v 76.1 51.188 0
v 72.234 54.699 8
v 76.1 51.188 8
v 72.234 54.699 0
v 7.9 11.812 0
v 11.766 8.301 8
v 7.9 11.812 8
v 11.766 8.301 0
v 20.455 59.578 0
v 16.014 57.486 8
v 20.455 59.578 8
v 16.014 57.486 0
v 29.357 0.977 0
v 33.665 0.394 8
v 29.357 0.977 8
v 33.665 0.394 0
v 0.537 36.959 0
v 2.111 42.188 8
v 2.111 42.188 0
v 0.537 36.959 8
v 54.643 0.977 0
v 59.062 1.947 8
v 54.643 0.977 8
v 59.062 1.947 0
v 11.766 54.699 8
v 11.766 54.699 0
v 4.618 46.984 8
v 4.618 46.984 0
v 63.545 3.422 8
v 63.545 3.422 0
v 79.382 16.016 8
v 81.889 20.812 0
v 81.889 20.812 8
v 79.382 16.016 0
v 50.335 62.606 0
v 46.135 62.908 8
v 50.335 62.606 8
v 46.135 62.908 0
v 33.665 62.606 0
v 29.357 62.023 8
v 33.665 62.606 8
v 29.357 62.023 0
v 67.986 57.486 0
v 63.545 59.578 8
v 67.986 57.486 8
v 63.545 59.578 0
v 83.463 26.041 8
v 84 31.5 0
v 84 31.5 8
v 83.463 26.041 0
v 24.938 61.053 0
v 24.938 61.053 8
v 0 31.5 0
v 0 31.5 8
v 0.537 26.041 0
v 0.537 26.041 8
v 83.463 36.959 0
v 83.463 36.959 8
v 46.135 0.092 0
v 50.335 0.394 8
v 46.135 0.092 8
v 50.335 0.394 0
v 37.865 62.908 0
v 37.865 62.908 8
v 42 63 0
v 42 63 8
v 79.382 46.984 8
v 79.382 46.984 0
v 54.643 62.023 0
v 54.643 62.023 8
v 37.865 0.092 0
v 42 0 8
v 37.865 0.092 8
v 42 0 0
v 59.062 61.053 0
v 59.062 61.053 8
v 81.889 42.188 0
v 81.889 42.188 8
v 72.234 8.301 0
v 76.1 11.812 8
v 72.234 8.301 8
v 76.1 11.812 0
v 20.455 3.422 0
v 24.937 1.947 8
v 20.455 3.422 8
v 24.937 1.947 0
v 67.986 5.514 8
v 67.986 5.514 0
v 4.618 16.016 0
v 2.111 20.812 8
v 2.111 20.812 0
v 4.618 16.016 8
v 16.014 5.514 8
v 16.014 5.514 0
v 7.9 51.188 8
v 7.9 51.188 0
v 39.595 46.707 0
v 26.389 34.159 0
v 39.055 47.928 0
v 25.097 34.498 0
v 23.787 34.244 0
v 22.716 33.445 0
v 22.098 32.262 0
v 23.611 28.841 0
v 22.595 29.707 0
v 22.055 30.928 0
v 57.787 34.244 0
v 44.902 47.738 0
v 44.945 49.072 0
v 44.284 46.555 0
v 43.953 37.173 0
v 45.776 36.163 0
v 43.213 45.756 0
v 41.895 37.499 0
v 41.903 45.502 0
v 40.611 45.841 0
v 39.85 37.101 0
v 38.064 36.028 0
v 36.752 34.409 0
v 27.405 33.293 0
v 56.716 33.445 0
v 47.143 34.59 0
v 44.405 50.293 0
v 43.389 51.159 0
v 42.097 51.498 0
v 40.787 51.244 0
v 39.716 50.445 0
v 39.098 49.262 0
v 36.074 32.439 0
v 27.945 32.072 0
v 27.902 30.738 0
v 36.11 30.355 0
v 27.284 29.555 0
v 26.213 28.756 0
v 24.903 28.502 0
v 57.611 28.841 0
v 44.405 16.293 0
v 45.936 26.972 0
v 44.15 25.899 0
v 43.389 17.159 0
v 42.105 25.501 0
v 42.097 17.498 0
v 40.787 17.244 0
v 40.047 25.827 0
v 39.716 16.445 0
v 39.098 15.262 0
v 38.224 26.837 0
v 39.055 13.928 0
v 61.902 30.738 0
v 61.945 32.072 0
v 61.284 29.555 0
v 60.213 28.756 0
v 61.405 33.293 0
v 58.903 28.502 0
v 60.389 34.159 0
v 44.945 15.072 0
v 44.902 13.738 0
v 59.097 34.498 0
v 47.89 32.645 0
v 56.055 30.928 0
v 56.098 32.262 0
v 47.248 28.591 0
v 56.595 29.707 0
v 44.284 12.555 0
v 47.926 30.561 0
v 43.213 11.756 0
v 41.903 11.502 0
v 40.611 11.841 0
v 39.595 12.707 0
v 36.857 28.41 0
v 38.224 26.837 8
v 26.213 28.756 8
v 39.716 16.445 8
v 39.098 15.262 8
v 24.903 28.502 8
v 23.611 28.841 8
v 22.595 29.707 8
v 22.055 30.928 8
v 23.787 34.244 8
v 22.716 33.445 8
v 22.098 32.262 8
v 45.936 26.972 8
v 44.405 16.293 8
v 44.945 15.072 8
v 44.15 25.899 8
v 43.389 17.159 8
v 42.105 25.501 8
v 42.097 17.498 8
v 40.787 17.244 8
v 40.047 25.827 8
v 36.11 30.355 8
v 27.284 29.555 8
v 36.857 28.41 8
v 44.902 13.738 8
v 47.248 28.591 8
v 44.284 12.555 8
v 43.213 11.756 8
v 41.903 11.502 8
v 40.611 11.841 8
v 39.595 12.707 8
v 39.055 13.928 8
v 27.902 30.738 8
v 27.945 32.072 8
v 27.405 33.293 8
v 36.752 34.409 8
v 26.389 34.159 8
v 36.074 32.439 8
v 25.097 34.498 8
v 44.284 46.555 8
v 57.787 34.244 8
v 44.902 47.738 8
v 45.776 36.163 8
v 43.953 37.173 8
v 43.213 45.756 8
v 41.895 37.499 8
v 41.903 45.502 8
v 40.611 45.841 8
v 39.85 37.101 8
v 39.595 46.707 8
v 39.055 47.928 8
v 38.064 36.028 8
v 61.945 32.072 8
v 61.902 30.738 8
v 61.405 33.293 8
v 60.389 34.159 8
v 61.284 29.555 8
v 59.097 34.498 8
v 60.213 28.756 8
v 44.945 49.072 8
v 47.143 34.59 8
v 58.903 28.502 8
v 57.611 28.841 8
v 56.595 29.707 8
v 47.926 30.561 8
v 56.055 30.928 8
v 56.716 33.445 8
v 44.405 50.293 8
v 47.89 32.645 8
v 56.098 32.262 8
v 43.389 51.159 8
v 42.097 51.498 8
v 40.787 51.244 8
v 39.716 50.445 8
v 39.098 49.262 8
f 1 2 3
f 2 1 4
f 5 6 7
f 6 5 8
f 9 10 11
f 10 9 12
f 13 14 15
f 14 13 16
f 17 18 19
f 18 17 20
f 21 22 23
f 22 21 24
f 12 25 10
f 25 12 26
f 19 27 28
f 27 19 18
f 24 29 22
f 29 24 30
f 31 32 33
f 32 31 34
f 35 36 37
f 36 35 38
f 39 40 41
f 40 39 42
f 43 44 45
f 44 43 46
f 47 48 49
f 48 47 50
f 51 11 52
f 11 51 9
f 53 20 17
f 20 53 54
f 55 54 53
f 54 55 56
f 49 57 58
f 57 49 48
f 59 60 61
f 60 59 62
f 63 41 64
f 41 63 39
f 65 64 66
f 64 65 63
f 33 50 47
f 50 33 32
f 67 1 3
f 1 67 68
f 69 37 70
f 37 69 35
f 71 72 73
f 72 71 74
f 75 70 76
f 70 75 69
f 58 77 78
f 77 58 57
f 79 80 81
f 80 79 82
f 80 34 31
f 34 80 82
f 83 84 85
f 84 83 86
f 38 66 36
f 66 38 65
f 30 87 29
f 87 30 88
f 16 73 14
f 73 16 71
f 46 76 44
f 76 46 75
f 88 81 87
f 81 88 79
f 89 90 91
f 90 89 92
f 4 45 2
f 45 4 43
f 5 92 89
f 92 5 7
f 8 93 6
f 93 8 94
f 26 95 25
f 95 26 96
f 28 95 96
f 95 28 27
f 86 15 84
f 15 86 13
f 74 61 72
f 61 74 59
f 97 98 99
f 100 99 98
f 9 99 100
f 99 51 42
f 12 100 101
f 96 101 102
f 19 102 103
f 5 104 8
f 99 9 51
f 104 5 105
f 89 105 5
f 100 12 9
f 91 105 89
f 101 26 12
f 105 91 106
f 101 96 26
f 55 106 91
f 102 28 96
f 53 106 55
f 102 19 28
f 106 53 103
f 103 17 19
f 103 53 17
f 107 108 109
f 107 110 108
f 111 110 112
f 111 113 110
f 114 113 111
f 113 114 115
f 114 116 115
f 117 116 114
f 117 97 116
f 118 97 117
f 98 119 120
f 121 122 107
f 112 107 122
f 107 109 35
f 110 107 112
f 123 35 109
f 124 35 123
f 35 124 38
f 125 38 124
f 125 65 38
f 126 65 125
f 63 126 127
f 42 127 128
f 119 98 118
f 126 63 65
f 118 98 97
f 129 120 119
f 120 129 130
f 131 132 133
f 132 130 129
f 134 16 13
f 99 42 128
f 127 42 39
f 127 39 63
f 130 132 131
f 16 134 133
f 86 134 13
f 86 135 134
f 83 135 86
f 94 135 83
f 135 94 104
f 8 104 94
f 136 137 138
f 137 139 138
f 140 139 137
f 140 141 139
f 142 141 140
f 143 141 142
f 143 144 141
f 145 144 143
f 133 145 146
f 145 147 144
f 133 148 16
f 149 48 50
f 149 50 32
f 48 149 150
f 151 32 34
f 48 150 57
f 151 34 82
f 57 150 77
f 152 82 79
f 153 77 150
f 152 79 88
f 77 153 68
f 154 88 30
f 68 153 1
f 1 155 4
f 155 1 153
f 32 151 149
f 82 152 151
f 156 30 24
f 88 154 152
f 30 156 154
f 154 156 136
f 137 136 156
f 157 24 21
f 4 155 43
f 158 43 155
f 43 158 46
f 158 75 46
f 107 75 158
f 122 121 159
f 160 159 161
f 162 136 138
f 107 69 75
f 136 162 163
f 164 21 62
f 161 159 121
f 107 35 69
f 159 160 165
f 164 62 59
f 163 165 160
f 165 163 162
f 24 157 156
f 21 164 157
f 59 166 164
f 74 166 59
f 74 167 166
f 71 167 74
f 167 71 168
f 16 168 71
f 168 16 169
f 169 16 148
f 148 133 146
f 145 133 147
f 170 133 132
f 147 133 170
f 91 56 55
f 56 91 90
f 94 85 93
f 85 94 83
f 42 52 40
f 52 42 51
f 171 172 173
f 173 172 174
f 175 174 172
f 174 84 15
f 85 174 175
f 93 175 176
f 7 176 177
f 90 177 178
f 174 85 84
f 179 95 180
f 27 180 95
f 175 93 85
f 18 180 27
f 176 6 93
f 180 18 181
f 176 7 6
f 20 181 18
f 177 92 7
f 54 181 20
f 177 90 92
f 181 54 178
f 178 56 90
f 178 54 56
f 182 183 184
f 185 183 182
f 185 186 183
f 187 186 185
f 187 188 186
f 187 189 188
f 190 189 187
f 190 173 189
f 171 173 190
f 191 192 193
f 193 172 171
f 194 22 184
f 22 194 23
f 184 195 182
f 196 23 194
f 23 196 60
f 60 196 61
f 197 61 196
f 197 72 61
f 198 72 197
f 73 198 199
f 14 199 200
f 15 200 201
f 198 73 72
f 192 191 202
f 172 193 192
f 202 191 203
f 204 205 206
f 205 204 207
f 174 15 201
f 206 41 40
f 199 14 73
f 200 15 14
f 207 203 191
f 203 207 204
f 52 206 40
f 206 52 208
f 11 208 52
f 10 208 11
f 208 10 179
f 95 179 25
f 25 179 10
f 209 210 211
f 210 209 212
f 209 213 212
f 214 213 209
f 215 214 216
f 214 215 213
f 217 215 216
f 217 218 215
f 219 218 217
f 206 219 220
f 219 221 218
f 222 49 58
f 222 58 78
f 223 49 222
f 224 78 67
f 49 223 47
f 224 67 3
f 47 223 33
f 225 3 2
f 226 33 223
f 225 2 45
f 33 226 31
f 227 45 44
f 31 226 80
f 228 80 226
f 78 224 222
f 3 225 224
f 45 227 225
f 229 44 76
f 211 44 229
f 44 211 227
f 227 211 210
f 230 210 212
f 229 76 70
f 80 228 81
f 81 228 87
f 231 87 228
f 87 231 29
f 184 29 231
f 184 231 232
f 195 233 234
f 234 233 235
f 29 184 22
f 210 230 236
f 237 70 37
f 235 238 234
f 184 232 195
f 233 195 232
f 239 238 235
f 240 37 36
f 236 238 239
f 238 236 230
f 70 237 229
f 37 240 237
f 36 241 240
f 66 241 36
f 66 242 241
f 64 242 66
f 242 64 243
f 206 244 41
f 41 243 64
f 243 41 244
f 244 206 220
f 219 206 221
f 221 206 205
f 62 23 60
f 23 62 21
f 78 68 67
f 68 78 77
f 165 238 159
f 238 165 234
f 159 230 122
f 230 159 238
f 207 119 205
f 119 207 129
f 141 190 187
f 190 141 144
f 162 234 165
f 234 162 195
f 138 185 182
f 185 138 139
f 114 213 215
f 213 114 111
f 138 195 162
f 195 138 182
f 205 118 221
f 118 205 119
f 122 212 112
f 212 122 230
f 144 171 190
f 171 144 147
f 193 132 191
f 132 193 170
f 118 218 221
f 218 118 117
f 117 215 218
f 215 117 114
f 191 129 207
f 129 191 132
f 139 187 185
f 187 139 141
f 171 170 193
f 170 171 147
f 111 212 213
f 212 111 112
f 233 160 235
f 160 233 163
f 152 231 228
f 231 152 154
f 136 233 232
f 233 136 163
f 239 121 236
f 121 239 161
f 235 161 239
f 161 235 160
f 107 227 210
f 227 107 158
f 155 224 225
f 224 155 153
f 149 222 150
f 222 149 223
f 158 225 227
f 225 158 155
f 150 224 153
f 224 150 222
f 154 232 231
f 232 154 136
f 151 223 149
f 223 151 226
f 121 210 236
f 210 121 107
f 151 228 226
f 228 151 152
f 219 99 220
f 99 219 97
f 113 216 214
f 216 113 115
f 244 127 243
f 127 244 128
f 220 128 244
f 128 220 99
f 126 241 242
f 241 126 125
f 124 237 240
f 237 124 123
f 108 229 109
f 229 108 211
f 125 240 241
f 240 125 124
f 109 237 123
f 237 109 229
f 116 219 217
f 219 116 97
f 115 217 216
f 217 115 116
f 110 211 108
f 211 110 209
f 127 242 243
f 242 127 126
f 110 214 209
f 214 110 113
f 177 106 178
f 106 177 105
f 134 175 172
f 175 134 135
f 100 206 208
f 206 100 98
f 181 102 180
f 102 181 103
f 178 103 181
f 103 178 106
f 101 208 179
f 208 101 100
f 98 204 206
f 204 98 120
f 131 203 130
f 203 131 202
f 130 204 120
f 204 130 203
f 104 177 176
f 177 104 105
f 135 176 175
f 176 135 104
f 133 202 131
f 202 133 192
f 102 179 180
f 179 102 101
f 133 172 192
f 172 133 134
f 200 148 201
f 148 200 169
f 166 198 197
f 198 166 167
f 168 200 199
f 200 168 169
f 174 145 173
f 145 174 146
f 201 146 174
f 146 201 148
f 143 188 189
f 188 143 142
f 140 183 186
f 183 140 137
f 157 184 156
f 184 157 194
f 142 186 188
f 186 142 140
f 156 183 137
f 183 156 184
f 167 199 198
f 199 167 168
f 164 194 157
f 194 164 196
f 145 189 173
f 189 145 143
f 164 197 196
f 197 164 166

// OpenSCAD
$fn = 32;

// ----------------------------------------------------------------------
// Cam plate: double_lobe cam, base R28
// ----------------------------------------------------------------------

// --- parameters (mm) ---
base_r = 28;              // base circle radius
lobe_h = 14;              // cam lobe rise
bore_r = 6;               // shaft bore radius
plate_t = 8;              // plate thickness, Z (extrusion height)
ring_r = 17;              // lightening ring radius
bolt_r = 3;               // lightening hole radius

profile = [[84, 31.5], [83.463, 36.959], [81.889, 42.188], [79.382, 46.984], [76.1, 51.188], [72.234, 54.699], [67.986, 57.486], [63.545, 59.578], [59.062, 61.053], [54.643, 62.023], [50.335, 62.606], [46.135, 62.908], [42, 63], [37.865, 62.908], [33.665, 62.606], [29.357, 62.023], [24.938, 61.053], [20.455, 59.578], [16.014, 57.486], [11.766, 54.699], [7.9, 51.188], [4.618, 46.984], [2.111, 42.188], [0.537, 36.959], [0, 31.5], [0.537, 26.041], [2.111, 20.812], [4.618, 16.016], [7.9, 11.812], [11.766, 8.301], [16.014, 5.514], [20.455, 3.422], [24.937, 1.947], [29.357, 0.977], [33.665, 0.394], [37.865, 0.092], [42, 0], [46.135, 0.092], [50.335, 0.394], [54.643, 0.977], [59.062, 1.947], [63.545, 3.422], [67.986, 5.514], [72.234, 8.301], [76.1, 11.812], [79.382, 16.016], [81.889, 20.812], [83.463, 26.041]];  // primary outline, 48 points, counter clockwise
void_1 = [[47.89, 32.645], [47.143, 34.59], [45.776, 36.163], [43.953, 37.173], [41.895, 37.499], [39.85, 37.101], [38.064, 36.028], [36.752, 34.409], [36.074, 32.439], [36.11, 30.355], [36.857, 28.41], [38.224, 26.837], [40.047, 25.827], [42.105, 25.501], [44.15, 25.899], [45.936, 26.972], [47.248, 28.591], [47.926, 30.561]];  // shaft bore, 18 points
void_2 = [[61.945, 32.072], [61.405, 33.293], [60.389, 34.159], [59.097, 34.498], [57.787, 34.244], [56.716, 33.445], [56.098, 32.262], [56.055, 30.928], [56.595, 29.707], [57.611, 28.841], [58.903, 28.502], [60.213, 28.756], [61.284, 29.555], [61.902, 30.738]];  // lightening hole 1, 14 points
void_3 = [[44.945, 49.072], [44.405, 50.293], [43.389, 51.159], [42.097, 51.498], [40.787, 51.244], [39.716, 50.445], [39.098, 49.262], [39.055, 47.928], [39.595, 46.707], [40.611, 45.841], [41.903, 45.502], [43.213, 45.756], [44.284, 46.555], [44.902, 47.738]];  // lightening hole 2, 14 points
void_4 = [[27.945, 32.072], [27.405, 33.293], [26.389, 34.159], [25.097, 34.498], [23.787, 34.244], [22.716, 33.445], [22.098, 32.262], [22.055, 30.928], [22.595, 29.707], [23.611, 28.841], [24.903, 28.502], [26.213, 28.756], [27.284, 29.555], [27.902, 30.738]];  // lightening hole 3, 14 points
void_5 = [[44.945, 15.072], [44.405, 16.293], [43.389, 17.159], [42.097, 17.498], [40.787, 17.244], [39.716, 16.445], [39.098, 15.262], [39.055, 13.928], [39.595, 12.707], [40.611, 11.841], [41.903, 11.502], [43.213, 11.756], [44.284, 12.555], [44.902, 13.738]];  // lightening hole 4, 14 points

// --- the one profile operation ---
difference() {
  linear_extrude(height = plate_t) polygon(points = profile);
  translate([0, 0, -1])
    linear_extrude(height = plate_t + 2) polygon(points = void_1);
  translate([0, 0, -1])
    linear_extrude(height = plate_t + 2) polygon(points = void_2);
  translate([0, 0, -1])
    linear_extrude(height = plate_t + 2) polygon(points = void_3);
  translate([0, 0, -1])
    linear_extrude(height = plate_t + 2) polygon(points = void_4);
  translate([0, 0, -1])
    linear_extrude(height = plate_t + 2) polygon(points = void_5);
}
